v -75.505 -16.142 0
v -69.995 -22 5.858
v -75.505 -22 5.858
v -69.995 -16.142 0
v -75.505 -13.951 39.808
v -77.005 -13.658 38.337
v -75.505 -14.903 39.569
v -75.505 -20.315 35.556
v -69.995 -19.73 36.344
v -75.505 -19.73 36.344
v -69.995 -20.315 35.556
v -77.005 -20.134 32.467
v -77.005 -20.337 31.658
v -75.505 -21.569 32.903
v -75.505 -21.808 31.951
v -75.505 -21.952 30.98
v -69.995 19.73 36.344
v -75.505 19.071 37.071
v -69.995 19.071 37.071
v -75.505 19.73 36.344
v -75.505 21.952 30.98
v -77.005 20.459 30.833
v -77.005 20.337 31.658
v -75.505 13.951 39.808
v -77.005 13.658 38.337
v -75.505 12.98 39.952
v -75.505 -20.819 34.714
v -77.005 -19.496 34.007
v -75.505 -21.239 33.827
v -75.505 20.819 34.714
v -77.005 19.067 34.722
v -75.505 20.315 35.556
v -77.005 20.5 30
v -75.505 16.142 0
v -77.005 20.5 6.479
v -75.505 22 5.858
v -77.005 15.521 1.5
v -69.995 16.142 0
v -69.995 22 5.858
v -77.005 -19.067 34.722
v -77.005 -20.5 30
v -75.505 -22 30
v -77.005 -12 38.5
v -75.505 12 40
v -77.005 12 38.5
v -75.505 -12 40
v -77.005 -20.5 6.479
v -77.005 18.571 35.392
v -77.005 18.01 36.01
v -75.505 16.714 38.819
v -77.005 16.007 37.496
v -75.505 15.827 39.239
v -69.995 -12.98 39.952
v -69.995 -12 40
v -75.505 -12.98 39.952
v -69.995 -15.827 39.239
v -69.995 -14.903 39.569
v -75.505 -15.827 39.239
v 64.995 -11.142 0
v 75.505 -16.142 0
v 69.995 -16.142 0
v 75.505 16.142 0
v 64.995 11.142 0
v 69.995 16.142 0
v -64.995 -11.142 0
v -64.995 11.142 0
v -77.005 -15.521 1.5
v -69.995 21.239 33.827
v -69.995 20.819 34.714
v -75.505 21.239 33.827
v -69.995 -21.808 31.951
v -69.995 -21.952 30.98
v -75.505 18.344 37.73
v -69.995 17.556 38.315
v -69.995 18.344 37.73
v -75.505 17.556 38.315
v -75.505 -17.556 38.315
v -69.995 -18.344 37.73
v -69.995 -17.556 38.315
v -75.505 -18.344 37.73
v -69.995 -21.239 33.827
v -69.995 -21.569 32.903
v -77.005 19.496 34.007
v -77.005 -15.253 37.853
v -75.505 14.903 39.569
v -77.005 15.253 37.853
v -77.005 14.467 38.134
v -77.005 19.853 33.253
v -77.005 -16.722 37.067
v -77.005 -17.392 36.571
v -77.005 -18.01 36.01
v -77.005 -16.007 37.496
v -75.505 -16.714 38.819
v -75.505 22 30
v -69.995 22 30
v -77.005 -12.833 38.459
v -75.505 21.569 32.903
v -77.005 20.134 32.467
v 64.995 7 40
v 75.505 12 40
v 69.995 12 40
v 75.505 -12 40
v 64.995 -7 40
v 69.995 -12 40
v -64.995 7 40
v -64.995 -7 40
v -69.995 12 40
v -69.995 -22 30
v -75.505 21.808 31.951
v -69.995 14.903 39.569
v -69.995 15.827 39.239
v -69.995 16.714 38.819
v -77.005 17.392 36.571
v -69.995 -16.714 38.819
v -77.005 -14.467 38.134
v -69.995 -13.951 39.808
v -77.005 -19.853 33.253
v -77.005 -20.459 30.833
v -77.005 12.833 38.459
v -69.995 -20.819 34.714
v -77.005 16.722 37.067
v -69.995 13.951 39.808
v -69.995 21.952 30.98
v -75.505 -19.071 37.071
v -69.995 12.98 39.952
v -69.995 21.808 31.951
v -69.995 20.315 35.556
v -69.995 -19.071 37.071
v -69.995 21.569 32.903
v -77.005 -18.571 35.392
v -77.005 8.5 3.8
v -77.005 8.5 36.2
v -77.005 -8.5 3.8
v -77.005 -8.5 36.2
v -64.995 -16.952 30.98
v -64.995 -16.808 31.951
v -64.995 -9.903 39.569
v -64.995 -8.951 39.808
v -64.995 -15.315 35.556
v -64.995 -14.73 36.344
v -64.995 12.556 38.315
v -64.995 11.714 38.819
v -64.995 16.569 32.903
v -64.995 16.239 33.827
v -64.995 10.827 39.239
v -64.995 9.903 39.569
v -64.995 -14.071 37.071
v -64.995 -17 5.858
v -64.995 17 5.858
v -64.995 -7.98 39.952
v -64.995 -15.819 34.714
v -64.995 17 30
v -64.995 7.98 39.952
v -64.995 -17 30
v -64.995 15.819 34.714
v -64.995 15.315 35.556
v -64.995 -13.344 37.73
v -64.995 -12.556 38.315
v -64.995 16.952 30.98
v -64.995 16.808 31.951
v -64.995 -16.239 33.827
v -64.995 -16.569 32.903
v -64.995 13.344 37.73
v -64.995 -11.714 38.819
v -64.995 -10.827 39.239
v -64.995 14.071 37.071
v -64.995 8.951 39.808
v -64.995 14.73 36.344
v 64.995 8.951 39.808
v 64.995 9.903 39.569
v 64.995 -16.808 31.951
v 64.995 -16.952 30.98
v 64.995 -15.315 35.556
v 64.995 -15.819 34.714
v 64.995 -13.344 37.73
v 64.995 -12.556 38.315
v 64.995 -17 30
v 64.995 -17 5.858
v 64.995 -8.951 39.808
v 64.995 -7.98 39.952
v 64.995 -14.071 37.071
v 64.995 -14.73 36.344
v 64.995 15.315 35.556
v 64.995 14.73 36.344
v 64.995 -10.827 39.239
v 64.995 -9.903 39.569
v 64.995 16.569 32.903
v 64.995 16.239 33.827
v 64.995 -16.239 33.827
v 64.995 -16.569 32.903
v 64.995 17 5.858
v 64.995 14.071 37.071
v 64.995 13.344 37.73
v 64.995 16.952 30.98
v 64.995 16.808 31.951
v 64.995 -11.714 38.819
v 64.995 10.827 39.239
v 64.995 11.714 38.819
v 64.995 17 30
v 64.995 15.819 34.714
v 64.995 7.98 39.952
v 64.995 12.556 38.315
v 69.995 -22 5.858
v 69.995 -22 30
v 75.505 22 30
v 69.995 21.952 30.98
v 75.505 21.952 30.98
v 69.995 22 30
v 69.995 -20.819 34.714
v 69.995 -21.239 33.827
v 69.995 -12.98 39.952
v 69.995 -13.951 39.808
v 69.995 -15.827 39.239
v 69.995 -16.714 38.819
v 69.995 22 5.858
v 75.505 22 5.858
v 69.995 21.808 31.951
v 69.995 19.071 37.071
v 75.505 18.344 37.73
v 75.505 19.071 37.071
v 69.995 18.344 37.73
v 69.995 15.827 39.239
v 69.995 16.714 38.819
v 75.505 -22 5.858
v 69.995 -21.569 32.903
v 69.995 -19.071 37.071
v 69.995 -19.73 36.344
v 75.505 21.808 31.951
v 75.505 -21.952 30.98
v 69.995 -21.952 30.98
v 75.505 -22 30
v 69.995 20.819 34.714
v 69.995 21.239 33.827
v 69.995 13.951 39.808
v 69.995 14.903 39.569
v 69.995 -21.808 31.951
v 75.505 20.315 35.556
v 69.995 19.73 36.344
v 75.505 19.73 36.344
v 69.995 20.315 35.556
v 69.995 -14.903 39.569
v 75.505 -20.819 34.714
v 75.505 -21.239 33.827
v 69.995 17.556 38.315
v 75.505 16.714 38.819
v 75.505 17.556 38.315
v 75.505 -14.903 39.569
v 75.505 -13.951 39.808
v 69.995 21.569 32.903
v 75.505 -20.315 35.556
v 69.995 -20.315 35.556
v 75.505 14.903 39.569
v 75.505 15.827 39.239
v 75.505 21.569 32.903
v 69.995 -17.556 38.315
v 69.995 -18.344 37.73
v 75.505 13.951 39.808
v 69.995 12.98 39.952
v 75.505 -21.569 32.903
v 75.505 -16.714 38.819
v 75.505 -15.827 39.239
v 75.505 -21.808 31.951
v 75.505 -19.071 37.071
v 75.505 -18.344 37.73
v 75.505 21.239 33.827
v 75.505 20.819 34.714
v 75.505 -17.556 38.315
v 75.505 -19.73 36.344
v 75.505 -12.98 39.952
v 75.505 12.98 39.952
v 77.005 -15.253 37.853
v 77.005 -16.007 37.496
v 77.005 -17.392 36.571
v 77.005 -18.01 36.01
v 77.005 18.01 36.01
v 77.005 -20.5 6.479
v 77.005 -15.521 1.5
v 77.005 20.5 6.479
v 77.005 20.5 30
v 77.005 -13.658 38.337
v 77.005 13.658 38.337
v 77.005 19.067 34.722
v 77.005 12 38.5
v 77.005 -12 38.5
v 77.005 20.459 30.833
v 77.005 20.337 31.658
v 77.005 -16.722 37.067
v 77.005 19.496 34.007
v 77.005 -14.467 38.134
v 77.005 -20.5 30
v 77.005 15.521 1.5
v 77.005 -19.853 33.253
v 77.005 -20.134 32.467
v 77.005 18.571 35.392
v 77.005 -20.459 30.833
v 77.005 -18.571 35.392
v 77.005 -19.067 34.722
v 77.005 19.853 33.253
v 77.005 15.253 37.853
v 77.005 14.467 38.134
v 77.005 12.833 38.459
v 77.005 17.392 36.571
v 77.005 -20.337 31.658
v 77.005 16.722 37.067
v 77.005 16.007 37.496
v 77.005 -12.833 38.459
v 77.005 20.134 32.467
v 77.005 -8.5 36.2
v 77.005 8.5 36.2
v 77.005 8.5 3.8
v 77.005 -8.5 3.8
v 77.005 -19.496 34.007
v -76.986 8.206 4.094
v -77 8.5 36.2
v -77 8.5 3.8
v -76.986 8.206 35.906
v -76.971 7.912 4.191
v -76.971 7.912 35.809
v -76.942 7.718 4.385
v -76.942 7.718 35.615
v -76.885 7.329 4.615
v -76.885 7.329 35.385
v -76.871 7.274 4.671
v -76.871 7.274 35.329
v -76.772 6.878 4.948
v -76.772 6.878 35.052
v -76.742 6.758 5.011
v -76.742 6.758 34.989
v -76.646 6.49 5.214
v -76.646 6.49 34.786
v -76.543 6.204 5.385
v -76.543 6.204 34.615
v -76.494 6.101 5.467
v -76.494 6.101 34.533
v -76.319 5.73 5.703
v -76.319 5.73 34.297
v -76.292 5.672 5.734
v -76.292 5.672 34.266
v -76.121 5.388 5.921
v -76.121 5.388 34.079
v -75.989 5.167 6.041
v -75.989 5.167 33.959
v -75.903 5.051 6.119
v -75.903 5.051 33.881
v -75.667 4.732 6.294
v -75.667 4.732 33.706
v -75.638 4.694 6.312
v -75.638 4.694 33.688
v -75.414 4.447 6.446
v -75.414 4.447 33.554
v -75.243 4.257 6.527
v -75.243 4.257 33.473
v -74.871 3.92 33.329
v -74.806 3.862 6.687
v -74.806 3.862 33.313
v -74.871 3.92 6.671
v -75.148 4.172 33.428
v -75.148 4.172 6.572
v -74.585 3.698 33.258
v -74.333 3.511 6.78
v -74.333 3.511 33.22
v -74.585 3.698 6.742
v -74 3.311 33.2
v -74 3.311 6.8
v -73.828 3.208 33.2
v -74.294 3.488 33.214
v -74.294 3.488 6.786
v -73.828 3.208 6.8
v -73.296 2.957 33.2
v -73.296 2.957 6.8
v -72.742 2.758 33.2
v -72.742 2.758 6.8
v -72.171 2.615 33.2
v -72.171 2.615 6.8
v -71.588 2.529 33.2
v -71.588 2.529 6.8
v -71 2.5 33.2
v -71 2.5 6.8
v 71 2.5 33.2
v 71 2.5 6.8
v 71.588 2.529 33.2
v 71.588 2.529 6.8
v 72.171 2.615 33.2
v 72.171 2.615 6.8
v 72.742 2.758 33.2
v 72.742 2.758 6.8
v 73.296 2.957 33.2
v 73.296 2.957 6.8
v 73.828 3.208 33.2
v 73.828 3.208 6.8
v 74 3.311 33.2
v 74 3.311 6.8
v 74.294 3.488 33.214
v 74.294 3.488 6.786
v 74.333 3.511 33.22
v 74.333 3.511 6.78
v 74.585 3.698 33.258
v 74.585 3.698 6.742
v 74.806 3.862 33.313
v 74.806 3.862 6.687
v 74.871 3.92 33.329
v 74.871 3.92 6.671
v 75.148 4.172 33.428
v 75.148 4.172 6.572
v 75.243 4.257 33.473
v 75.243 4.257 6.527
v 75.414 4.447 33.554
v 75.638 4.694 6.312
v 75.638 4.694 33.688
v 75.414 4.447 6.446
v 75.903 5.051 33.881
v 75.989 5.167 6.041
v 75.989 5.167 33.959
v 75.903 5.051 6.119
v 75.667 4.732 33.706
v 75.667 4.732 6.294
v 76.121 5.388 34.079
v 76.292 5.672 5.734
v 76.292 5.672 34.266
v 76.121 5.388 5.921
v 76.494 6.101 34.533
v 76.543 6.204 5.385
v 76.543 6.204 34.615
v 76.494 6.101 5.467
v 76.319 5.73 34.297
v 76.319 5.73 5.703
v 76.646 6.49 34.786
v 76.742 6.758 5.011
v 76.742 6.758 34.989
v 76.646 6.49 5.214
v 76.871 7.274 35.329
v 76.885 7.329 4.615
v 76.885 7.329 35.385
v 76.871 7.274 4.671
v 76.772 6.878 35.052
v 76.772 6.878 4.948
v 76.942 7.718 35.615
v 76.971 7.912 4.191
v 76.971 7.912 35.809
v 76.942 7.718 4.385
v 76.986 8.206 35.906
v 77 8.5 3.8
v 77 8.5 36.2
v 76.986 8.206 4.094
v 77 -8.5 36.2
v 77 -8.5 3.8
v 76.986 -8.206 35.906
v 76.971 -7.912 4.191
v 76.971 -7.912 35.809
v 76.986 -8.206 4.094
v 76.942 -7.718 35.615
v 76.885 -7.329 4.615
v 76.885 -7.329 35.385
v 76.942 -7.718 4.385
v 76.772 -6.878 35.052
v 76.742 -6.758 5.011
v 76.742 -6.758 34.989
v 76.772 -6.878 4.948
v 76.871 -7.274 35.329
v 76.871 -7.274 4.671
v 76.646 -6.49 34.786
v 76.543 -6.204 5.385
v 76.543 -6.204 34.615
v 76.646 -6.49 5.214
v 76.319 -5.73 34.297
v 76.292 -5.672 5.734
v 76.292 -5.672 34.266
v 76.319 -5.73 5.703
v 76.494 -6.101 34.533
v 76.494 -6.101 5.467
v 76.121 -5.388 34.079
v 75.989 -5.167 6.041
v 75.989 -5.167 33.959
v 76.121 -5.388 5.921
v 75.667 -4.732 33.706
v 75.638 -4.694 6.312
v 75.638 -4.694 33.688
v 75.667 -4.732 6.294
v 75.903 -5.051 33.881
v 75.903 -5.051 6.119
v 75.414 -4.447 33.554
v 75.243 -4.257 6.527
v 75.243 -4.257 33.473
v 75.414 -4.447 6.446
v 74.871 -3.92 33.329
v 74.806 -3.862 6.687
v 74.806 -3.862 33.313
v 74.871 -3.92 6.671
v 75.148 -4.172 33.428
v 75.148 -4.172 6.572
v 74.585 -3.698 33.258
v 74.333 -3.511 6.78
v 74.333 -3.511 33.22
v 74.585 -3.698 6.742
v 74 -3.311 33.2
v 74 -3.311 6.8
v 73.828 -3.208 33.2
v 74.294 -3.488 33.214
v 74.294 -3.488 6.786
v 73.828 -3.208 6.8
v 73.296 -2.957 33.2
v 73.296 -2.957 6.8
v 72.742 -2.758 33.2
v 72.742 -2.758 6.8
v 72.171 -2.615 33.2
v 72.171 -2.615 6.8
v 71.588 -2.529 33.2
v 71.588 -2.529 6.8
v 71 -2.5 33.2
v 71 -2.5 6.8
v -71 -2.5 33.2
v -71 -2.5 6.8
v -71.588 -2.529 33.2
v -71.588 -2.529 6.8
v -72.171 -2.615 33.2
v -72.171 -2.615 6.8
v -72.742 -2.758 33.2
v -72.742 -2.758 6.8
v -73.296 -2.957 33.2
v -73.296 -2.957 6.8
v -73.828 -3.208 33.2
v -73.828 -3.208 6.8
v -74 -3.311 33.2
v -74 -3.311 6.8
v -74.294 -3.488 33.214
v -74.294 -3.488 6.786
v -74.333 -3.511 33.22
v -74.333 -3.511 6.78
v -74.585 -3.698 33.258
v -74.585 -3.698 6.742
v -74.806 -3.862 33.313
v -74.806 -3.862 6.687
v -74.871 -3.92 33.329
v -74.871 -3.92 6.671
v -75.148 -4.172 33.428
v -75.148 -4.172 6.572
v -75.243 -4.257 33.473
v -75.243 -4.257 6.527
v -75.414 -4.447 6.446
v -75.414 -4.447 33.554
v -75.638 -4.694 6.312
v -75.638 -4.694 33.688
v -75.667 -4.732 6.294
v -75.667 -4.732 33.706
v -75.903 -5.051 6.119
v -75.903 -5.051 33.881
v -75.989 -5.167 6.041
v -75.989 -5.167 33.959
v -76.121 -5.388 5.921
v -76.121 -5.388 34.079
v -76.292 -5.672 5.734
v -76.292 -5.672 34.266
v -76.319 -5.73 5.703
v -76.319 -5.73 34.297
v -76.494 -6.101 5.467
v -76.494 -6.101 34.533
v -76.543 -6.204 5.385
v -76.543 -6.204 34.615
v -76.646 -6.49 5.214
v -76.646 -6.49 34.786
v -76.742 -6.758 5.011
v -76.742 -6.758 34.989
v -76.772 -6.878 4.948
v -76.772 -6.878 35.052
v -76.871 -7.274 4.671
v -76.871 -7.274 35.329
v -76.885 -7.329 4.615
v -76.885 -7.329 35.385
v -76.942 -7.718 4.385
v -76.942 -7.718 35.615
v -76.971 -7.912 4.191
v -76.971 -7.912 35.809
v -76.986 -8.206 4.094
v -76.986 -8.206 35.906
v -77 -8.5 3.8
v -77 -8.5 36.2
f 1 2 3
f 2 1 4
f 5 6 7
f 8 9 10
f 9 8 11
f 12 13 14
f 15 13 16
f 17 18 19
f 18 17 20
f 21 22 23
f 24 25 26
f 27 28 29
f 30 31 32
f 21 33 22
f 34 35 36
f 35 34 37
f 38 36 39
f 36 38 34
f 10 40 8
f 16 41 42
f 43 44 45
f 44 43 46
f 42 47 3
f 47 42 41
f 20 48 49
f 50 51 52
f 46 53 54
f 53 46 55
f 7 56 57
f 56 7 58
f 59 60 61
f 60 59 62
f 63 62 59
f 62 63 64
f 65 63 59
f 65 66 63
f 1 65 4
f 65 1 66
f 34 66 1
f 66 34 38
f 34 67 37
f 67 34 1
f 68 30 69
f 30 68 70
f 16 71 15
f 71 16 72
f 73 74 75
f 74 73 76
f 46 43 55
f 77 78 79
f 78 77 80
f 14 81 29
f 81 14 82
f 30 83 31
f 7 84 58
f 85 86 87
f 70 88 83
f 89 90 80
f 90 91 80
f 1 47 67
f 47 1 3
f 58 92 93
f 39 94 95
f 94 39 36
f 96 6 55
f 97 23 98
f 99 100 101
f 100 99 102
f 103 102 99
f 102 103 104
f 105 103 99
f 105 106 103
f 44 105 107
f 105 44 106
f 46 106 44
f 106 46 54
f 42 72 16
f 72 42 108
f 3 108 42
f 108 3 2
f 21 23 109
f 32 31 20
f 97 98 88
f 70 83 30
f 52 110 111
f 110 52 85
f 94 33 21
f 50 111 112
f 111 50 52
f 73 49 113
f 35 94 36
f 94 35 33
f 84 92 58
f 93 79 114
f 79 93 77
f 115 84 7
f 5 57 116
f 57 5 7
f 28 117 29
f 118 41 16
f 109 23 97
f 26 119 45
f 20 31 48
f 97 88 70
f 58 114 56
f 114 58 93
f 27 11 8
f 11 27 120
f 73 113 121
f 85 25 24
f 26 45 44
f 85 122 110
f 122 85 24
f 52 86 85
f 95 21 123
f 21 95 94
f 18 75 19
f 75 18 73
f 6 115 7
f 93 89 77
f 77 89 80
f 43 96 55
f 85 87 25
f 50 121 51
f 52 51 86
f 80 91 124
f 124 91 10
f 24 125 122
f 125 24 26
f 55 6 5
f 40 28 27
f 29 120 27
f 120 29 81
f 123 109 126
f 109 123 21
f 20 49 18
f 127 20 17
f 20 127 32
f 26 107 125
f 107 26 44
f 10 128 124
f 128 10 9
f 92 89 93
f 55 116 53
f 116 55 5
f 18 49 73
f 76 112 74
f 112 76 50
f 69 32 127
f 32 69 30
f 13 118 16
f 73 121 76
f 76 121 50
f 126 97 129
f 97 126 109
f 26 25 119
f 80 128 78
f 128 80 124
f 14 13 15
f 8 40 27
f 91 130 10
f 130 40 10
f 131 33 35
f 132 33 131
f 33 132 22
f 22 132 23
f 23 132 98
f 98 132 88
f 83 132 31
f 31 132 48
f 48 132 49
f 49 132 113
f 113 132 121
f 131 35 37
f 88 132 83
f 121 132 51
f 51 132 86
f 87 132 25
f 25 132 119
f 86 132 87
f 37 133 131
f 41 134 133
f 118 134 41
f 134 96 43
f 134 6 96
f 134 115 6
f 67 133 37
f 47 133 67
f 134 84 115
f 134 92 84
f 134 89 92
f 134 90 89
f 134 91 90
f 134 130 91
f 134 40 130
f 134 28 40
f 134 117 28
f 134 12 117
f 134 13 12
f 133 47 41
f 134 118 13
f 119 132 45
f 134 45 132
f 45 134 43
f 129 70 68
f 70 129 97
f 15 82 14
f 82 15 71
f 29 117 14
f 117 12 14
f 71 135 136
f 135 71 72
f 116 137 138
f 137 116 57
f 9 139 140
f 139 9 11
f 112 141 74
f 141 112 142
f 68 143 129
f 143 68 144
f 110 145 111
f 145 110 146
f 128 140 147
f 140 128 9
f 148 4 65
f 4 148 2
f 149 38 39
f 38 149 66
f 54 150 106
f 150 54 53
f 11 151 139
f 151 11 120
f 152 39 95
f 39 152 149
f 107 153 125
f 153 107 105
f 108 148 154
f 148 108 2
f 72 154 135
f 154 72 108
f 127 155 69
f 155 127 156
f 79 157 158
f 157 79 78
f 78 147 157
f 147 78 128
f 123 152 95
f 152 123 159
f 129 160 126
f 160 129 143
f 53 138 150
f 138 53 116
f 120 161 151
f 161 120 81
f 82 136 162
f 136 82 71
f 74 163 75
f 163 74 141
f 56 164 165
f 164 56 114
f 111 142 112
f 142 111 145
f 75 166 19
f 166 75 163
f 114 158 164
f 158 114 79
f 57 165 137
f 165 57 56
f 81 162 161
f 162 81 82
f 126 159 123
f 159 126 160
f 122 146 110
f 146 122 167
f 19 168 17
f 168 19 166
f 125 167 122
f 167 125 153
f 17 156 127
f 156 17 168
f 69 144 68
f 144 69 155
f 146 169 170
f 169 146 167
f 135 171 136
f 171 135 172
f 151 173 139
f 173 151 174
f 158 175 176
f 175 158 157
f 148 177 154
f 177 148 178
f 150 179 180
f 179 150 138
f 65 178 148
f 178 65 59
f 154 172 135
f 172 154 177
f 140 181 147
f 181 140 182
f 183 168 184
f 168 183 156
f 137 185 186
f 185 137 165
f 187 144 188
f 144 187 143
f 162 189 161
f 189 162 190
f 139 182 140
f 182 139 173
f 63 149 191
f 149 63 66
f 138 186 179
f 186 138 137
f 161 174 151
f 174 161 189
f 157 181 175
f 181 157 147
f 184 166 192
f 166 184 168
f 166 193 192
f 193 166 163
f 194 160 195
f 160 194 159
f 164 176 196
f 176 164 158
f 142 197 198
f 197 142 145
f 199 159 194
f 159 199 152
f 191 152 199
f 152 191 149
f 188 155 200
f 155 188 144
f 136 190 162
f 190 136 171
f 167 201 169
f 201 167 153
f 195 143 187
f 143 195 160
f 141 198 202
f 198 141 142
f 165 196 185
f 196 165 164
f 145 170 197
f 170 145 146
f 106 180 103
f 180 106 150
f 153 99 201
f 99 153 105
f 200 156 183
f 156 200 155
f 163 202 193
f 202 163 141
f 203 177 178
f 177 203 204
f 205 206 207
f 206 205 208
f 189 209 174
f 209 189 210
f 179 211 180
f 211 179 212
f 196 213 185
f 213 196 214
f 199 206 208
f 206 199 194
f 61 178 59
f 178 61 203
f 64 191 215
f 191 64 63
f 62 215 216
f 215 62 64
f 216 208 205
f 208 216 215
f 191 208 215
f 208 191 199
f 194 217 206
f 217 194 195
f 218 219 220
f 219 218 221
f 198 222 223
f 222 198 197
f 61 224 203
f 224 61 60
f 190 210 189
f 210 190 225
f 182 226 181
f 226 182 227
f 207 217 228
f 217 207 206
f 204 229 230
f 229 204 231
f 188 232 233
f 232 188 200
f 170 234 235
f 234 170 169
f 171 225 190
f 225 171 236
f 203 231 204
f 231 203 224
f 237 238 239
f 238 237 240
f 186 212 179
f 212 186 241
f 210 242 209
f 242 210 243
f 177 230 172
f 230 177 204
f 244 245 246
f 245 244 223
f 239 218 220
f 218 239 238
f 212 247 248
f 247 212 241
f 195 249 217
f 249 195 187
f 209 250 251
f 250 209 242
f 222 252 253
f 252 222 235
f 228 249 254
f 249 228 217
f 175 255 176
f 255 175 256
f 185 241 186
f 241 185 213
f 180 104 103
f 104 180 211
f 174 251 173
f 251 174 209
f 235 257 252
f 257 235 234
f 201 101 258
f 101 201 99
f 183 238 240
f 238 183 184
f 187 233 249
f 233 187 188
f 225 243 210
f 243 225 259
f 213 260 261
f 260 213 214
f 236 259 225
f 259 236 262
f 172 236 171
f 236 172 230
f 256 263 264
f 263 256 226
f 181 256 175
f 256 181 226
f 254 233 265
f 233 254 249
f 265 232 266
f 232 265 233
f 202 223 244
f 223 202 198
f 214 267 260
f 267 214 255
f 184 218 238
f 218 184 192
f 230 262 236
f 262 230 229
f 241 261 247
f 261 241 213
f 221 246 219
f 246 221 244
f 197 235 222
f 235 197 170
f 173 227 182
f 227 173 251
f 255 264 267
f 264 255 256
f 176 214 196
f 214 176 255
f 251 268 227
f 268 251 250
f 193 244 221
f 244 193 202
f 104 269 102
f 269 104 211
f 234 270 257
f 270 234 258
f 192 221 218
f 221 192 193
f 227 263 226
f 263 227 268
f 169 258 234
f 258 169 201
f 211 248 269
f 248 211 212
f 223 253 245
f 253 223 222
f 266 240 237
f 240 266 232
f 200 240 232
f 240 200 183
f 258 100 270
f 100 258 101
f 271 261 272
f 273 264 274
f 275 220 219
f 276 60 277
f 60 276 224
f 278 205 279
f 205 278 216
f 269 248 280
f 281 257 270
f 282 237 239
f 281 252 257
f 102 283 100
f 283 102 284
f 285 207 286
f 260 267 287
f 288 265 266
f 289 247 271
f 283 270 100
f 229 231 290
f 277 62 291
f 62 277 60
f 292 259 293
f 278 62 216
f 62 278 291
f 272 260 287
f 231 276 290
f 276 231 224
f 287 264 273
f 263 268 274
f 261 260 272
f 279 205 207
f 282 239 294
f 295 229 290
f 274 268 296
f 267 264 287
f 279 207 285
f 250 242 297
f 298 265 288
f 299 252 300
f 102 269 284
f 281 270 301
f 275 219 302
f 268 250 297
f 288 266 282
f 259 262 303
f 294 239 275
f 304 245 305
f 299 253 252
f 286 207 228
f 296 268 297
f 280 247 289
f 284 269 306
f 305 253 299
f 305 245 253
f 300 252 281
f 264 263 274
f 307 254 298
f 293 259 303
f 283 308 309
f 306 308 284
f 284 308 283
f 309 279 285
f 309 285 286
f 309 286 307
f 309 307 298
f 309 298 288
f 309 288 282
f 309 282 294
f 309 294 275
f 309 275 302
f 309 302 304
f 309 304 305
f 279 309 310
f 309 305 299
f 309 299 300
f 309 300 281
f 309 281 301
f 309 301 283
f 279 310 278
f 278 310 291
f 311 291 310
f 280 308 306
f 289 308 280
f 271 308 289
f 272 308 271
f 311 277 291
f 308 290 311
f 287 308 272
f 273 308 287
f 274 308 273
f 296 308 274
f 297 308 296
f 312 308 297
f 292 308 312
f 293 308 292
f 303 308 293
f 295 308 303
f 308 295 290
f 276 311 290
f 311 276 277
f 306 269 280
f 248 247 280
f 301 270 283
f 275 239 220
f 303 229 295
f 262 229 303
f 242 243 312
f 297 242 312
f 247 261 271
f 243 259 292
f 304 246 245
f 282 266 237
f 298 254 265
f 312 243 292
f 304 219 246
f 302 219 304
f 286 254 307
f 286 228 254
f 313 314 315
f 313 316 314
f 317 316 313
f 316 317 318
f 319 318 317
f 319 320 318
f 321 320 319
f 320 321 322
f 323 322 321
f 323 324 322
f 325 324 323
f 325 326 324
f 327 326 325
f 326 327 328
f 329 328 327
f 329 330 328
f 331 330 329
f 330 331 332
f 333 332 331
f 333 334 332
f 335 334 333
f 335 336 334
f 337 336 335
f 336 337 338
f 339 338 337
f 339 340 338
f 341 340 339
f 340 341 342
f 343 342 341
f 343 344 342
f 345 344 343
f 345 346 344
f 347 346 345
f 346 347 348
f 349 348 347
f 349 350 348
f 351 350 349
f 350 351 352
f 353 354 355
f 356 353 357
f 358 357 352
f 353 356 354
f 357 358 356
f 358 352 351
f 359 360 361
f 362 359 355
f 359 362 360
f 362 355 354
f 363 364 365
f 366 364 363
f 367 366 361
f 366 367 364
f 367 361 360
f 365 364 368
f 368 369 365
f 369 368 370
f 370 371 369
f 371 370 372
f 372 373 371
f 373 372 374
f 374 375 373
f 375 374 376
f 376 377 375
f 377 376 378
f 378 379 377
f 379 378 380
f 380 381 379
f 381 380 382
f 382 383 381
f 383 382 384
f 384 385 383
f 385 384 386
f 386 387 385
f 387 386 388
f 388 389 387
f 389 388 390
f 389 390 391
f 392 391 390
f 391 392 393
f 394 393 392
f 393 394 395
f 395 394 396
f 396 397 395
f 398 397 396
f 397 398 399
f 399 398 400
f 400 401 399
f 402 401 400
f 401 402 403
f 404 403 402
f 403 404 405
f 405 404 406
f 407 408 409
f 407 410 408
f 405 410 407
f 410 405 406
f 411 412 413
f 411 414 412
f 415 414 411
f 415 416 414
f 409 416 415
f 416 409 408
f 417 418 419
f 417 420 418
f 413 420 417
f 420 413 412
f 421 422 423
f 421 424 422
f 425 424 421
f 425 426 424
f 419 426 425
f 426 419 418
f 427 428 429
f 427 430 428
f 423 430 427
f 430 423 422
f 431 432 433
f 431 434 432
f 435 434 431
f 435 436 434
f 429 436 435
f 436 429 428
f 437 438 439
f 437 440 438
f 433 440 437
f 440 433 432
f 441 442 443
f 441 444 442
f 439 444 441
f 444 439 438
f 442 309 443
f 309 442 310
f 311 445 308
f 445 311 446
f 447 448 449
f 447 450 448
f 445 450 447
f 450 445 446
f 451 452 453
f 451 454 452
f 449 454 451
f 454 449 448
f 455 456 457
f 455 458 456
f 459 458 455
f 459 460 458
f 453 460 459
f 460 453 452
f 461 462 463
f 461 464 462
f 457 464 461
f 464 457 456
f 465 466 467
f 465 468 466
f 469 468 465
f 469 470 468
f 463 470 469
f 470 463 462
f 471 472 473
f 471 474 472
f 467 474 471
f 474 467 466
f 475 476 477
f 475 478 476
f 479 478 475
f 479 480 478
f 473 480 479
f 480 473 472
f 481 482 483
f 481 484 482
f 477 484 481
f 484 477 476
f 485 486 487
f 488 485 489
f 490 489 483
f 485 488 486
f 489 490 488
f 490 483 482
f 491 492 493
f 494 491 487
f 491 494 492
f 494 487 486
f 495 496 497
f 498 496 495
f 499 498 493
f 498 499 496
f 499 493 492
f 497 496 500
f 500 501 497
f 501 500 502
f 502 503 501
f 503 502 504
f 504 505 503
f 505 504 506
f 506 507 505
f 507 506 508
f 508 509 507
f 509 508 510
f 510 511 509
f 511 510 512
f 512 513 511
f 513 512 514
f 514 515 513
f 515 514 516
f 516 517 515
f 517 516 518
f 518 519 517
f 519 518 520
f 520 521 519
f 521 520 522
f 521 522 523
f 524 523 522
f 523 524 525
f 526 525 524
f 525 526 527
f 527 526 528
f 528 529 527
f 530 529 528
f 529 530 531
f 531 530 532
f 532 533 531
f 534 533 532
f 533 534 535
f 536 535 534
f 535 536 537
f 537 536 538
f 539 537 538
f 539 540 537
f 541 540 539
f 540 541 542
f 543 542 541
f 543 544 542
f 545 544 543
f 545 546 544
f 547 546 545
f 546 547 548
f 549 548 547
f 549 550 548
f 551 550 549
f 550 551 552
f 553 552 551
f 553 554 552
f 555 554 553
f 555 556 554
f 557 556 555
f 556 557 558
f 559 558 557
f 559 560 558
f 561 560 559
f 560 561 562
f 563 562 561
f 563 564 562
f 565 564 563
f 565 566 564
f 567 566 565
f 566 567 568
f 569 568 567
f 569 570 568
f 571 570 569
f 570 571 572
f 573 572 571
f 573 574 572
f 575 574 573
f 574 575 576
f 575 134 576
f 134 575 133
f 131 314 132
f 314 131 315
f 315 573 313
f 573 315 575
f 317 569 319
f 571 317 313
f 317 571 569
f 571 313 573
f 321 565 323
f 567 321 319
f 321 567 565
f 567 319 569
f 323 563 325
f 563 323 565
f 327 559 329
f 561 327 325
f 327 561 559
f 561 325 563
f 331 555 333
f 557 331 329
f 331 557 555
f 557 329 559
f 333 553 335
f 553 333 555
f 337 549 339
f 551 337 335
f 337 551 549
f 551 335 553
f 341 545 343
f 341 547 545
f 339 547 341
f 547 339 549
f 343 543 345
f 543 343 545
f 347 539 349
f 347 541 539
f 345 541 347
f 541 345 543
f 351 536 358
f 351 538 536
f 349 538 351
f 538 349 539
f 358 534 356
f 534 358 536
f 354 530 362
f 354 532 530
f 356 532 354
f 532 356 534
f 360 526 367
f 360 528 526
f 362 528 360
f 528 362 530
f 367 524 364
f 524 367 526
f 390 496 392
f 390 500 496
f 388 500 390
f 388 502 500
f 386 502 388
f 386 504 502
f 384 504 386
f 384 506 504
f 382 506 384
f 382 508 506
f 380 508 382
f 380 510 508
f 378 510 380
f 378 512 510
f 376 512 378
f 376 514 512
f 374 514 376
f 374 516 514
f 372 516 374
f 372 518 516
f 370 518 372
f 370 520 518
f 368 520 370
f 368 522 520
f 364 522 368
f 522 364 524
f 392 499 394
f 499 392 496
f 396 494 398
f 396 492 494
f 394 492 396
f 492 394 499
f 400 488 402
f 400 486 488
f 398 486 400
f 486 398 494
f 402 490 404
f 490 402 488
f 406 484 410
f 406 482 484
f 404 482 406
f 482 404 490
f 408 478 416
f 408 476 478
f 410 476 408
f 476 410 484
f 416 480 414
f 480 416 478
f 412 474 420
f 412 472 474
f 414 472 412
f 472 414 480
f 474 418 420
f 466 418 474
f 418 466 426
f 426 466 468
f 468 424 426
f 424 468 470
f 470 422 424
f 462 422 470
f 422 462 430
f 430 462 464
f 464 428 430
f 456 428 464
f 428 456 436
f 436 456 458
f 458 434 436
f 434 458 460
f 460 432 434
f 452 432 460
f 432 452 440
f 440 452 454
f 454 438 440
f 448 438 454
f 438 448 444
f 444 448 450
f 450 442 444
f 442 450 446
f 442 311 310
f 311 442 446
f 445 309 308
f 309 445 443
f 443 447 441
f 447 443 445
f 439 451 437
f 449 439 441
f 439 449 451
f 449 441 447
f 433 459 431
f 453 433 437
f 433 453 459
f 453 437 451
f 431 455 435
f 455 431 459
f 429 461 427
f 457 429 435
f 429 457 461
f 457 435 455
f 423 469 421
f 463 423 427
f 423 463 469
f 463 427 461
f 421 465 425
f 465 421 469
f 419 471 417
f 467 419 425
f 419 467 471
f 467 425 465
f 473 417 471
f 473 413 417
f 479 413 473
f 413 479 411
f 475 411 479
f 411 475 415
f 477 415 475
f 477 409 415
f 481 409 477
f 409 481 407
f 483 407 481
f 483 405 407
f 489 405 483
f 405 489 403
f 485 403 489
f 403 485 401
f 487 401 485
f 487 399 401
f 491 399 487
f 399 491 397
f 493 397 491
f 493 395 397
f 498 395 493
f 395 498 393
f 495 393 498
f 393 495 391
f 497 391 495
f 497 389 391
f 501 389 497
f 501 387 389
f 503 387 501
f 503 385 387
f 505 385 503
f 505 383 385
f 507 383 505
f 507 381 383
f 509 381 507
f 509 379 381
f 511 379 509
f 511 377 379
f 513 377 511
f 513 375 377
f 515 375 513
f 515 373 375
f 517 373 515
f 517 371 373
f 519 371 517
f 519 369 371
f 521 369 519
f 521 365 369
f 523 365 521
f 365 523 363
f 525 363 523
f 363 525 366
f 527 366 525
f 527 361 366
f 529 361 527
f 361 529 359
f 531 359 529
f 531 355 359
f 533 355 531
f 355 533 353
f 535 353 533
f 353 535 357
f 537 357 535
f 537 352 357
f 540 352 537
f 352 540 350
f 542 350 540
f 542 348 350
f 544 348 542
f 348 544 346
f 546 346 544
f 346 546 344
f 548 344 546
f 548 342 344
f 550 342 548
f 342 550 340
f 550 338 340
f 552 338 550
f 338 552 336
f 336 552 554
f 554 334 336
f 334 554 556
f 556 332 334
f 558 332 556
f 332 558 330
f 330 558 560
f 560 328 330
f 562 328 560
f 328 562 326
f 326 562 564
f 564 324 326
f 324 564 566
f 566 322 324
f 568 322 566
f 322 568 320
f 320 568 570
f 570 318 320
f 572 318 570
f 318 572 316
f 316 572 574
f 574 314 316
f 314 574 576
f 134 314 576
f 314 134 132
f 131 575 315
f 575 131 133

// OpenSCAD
// SPDX-License-Identifier: MIT
// Harness handle: a grip for the VSM Base's carrying harness
// Copyright (c) 2026 Robert Drzyzgula
// All dimensions in mm unless noted.
//
// The harness is two lengths of webbing, each from a front corner's harness
// rod to the opposite back corner's (see "Carrying" in the User's Guide).
// Here they cross in a handle: both lengths run through a tunnel along the
// grip, one on top of the other, and are sewn together just outside each
// end. Your hand lifts the webbing through the grip's floor, so the plastic
// is in compression; the webbing carries the load.
//
// The tunnel's ends are rounded where the webbing turns down toward the
// corners, top and bottom (so the handle works either way up) and at the
// sides (the lengths leave each end toward the front and the back). A
// ridge at each end keeps the hand off those turns.
//
// Prints on its side, with no supports: the tunnel stands on edge, so its
// roof is a short bridge, and the hand's load lies in the layers.
// Self-contained: no libraries needed.
//
// Drawn by Claude at Robert Drzyzgula's direction. Spun off from the
// VSM Base (https://github.com/bobdrzyzgula/VSM-Base). Not load-tested:
// see the README.

/* [Webbing] */
// Webbing width (1" = 25.4)
webbing_w = 25.4; // [15 : 0.1 : 51]
// Thickness of one layer of webbing (measure yours; 1" nylon or polyester is about 1.2 to 2 mm)
webbing_t = 2; // [0.8 : 0.1 : 4]
// Layers through the tunnel (two lengths of webbing)
layers = 2; // [1 : 1 : 4]
// Clearance added to the tunnel's width and to its height
tunnel_clear = 1; // [0 : 0.1 : 3]

/* [Grip] */
// Length for the hand, between the end ridges (generous: about a hand's width plus 25 mm)
grip_length = 130; // [80 : 1 : 200]
// Grip height, top to bottom as carried
grip_h = 34; // [20 : 0.5 : 60]
// Grip width, front to back as carried (at least the tunnel plus two side walls)
grip_w = 40; // [25 : 0.5 : 70]
// Radius of the grip's long edges
grip_r = 10; // [2 : 0.5 : 25]

/* [Ends] */
// End ridges: how far each rises above and below the grip
ridge = 5; // [0 : 0.5 : 15]
// Length of each end ridge
ridge_len = 12; // [6 : 0.5 : 30]
// Radius the webbing turns over at the tunnel's top and bottom edges
lip_r = 6; // [1 : 0.5 : 15]
// Radius at the tunnel's side edges
side_r = 3; // [0 : 0.5 : 10]
// Chamfer on the outer edges of the end faces
end_chamfer = 1.5; // [0 : 0.1 : 4]

/* [Output] */
// Lay it on its side for printing, or show it as carried
orientation = "print"; // [print, carried]

/* [Hidden] */
$fn = 64;
e = 0.01;

tw   = webbing_w + tunnel_clear;               // tunnel width (y)
th   = layers * webbing_t + tunnel_clear;      // tunnel height (z)
L    = grip_length + 2 * ridge_len;            // overall length (x)
gh2  = grip_h + 2 * ridge;                     // height at the ridges
wall = (grip_w - tw) / 2;                      // side wall beside the tunnel
roof = (grip_h - th) / 2;                      // wall above and below it

echo(str("Harness handle: ", L, " x ", grip_w, " x ", gh2, " mm overall; tunnel ",
         tw, " x ", th, " mm; side walls ", wall, " mm, top and bottom ", roof, " mm"));
assert(wall >= 2.5, "grip_w leaves side walls under 2.5 mm beside the tunnel: widen the grip");
assert(roof >= lip_r + 1, "grip_h leaves too little above and below the tunnel for lip_r");
assert(wall - side_r >= 2, "side_r leaves under 2 mm of side wall at the ends");
if (wall < 4) echo("WARNING: side walls under 4 mm; consider a wider grip");

// Cross-section, as carried: y across (front to back), z up. Rounded long
// edges on the front; on the side that prints on the bed (y < 0), 45°
// chamfers instead, so they print without drooping.
module section(w, h, r, inset = 0) {
    w1 = w - 2 * inset; h1 = h - 2 * inset; r1 = max(r - inset, 0.5);
    c = r1 * (2 - sqrt(2));          // chamfer that cuts about as deep as the round
    hull() {
        for (z = [-1, 1]) translate([w1 / 2 - r1, z * (h1 / 2 - r1)]) circle(r = r1);
        polygon([[-w1 / 2 + c, -h1 / 2], [-w1 / 2, -h1 / 2 + c], [-w1 / 2, h1 / 2 - c], [-w1 / 2 + c, h1 / 2]]);
    }
}

// A thin slice of a section at station x
module slice(x, h, inset = 0)
    translate([x, 0, 0]) rotate([90, 0, 90]) linear_extrude(height = e, center = true)
        section(grip_w, h, grip_r, inset);

// The body: grip, 45° steps up to the ridges, chamfered ends
module body() {
    xs = [-L / 2, -L / 2 + end_chamfer, -grip_length / 2 - ridge, -grip_length / 2,
          grip_length / 2, grip_length / 2 + ridge, L / 2 - end_chamfer, L / 2];
    hs = [gh2, gh2, gh2, grip_h, grip_h, gh2, gh2, gh2];
    ins = [end_chamfer, 0, 0, 0, 0, 0, 0, end_chamfer];
    for (i = [0 : len(xs) - 2]) hull() {
        slice(xs[i], hs[i], ins[i]);
        slice(xs[i + 1], hs[i + 1], ins[i + 1]);
    }
}

// Tunnel profile in one plane: a slot of half-width a along x, its edges
// rounded with radius r where they meet the end faces (a horn at each end)
module horn(a, r) {
    square([L + 2, 2 * a], center = true);
    for (sx = [-1, 1], sy = [-1, 1]) {
        translate([sx * L / 2, sy * a]) mirror([sx < 0 ? 1 : 0, 0]) mirror([0, sy < 0 ? 1 : 0])
            difference() {
                translate([-r, 0]) square([r + 1, r]);
                translate([-r, r]) circle(r = r);
            }
    }
}

module tunnel() {
    intersection() {
        // top and bottom lips: profile in x-z, run across y
        rotate([90, 0, 0]) linear_extrude(height = grip_w + 2, center = true) horn(th / 2, lip_r);
        // side edges: profile in x-y, run up and down z
        linear_extrude(height = gh2 + 2, center = true) horn(tw / 2, max(side_r, e));
    }
}

module handle() difference() { body(); tunnel(); }

// Print on its side, the chamfered side down; or as carried
if (orientation == "print") translate([0, 0, grip_w / 2]) rotate([90, 0, 0]) handle();
else handle();
